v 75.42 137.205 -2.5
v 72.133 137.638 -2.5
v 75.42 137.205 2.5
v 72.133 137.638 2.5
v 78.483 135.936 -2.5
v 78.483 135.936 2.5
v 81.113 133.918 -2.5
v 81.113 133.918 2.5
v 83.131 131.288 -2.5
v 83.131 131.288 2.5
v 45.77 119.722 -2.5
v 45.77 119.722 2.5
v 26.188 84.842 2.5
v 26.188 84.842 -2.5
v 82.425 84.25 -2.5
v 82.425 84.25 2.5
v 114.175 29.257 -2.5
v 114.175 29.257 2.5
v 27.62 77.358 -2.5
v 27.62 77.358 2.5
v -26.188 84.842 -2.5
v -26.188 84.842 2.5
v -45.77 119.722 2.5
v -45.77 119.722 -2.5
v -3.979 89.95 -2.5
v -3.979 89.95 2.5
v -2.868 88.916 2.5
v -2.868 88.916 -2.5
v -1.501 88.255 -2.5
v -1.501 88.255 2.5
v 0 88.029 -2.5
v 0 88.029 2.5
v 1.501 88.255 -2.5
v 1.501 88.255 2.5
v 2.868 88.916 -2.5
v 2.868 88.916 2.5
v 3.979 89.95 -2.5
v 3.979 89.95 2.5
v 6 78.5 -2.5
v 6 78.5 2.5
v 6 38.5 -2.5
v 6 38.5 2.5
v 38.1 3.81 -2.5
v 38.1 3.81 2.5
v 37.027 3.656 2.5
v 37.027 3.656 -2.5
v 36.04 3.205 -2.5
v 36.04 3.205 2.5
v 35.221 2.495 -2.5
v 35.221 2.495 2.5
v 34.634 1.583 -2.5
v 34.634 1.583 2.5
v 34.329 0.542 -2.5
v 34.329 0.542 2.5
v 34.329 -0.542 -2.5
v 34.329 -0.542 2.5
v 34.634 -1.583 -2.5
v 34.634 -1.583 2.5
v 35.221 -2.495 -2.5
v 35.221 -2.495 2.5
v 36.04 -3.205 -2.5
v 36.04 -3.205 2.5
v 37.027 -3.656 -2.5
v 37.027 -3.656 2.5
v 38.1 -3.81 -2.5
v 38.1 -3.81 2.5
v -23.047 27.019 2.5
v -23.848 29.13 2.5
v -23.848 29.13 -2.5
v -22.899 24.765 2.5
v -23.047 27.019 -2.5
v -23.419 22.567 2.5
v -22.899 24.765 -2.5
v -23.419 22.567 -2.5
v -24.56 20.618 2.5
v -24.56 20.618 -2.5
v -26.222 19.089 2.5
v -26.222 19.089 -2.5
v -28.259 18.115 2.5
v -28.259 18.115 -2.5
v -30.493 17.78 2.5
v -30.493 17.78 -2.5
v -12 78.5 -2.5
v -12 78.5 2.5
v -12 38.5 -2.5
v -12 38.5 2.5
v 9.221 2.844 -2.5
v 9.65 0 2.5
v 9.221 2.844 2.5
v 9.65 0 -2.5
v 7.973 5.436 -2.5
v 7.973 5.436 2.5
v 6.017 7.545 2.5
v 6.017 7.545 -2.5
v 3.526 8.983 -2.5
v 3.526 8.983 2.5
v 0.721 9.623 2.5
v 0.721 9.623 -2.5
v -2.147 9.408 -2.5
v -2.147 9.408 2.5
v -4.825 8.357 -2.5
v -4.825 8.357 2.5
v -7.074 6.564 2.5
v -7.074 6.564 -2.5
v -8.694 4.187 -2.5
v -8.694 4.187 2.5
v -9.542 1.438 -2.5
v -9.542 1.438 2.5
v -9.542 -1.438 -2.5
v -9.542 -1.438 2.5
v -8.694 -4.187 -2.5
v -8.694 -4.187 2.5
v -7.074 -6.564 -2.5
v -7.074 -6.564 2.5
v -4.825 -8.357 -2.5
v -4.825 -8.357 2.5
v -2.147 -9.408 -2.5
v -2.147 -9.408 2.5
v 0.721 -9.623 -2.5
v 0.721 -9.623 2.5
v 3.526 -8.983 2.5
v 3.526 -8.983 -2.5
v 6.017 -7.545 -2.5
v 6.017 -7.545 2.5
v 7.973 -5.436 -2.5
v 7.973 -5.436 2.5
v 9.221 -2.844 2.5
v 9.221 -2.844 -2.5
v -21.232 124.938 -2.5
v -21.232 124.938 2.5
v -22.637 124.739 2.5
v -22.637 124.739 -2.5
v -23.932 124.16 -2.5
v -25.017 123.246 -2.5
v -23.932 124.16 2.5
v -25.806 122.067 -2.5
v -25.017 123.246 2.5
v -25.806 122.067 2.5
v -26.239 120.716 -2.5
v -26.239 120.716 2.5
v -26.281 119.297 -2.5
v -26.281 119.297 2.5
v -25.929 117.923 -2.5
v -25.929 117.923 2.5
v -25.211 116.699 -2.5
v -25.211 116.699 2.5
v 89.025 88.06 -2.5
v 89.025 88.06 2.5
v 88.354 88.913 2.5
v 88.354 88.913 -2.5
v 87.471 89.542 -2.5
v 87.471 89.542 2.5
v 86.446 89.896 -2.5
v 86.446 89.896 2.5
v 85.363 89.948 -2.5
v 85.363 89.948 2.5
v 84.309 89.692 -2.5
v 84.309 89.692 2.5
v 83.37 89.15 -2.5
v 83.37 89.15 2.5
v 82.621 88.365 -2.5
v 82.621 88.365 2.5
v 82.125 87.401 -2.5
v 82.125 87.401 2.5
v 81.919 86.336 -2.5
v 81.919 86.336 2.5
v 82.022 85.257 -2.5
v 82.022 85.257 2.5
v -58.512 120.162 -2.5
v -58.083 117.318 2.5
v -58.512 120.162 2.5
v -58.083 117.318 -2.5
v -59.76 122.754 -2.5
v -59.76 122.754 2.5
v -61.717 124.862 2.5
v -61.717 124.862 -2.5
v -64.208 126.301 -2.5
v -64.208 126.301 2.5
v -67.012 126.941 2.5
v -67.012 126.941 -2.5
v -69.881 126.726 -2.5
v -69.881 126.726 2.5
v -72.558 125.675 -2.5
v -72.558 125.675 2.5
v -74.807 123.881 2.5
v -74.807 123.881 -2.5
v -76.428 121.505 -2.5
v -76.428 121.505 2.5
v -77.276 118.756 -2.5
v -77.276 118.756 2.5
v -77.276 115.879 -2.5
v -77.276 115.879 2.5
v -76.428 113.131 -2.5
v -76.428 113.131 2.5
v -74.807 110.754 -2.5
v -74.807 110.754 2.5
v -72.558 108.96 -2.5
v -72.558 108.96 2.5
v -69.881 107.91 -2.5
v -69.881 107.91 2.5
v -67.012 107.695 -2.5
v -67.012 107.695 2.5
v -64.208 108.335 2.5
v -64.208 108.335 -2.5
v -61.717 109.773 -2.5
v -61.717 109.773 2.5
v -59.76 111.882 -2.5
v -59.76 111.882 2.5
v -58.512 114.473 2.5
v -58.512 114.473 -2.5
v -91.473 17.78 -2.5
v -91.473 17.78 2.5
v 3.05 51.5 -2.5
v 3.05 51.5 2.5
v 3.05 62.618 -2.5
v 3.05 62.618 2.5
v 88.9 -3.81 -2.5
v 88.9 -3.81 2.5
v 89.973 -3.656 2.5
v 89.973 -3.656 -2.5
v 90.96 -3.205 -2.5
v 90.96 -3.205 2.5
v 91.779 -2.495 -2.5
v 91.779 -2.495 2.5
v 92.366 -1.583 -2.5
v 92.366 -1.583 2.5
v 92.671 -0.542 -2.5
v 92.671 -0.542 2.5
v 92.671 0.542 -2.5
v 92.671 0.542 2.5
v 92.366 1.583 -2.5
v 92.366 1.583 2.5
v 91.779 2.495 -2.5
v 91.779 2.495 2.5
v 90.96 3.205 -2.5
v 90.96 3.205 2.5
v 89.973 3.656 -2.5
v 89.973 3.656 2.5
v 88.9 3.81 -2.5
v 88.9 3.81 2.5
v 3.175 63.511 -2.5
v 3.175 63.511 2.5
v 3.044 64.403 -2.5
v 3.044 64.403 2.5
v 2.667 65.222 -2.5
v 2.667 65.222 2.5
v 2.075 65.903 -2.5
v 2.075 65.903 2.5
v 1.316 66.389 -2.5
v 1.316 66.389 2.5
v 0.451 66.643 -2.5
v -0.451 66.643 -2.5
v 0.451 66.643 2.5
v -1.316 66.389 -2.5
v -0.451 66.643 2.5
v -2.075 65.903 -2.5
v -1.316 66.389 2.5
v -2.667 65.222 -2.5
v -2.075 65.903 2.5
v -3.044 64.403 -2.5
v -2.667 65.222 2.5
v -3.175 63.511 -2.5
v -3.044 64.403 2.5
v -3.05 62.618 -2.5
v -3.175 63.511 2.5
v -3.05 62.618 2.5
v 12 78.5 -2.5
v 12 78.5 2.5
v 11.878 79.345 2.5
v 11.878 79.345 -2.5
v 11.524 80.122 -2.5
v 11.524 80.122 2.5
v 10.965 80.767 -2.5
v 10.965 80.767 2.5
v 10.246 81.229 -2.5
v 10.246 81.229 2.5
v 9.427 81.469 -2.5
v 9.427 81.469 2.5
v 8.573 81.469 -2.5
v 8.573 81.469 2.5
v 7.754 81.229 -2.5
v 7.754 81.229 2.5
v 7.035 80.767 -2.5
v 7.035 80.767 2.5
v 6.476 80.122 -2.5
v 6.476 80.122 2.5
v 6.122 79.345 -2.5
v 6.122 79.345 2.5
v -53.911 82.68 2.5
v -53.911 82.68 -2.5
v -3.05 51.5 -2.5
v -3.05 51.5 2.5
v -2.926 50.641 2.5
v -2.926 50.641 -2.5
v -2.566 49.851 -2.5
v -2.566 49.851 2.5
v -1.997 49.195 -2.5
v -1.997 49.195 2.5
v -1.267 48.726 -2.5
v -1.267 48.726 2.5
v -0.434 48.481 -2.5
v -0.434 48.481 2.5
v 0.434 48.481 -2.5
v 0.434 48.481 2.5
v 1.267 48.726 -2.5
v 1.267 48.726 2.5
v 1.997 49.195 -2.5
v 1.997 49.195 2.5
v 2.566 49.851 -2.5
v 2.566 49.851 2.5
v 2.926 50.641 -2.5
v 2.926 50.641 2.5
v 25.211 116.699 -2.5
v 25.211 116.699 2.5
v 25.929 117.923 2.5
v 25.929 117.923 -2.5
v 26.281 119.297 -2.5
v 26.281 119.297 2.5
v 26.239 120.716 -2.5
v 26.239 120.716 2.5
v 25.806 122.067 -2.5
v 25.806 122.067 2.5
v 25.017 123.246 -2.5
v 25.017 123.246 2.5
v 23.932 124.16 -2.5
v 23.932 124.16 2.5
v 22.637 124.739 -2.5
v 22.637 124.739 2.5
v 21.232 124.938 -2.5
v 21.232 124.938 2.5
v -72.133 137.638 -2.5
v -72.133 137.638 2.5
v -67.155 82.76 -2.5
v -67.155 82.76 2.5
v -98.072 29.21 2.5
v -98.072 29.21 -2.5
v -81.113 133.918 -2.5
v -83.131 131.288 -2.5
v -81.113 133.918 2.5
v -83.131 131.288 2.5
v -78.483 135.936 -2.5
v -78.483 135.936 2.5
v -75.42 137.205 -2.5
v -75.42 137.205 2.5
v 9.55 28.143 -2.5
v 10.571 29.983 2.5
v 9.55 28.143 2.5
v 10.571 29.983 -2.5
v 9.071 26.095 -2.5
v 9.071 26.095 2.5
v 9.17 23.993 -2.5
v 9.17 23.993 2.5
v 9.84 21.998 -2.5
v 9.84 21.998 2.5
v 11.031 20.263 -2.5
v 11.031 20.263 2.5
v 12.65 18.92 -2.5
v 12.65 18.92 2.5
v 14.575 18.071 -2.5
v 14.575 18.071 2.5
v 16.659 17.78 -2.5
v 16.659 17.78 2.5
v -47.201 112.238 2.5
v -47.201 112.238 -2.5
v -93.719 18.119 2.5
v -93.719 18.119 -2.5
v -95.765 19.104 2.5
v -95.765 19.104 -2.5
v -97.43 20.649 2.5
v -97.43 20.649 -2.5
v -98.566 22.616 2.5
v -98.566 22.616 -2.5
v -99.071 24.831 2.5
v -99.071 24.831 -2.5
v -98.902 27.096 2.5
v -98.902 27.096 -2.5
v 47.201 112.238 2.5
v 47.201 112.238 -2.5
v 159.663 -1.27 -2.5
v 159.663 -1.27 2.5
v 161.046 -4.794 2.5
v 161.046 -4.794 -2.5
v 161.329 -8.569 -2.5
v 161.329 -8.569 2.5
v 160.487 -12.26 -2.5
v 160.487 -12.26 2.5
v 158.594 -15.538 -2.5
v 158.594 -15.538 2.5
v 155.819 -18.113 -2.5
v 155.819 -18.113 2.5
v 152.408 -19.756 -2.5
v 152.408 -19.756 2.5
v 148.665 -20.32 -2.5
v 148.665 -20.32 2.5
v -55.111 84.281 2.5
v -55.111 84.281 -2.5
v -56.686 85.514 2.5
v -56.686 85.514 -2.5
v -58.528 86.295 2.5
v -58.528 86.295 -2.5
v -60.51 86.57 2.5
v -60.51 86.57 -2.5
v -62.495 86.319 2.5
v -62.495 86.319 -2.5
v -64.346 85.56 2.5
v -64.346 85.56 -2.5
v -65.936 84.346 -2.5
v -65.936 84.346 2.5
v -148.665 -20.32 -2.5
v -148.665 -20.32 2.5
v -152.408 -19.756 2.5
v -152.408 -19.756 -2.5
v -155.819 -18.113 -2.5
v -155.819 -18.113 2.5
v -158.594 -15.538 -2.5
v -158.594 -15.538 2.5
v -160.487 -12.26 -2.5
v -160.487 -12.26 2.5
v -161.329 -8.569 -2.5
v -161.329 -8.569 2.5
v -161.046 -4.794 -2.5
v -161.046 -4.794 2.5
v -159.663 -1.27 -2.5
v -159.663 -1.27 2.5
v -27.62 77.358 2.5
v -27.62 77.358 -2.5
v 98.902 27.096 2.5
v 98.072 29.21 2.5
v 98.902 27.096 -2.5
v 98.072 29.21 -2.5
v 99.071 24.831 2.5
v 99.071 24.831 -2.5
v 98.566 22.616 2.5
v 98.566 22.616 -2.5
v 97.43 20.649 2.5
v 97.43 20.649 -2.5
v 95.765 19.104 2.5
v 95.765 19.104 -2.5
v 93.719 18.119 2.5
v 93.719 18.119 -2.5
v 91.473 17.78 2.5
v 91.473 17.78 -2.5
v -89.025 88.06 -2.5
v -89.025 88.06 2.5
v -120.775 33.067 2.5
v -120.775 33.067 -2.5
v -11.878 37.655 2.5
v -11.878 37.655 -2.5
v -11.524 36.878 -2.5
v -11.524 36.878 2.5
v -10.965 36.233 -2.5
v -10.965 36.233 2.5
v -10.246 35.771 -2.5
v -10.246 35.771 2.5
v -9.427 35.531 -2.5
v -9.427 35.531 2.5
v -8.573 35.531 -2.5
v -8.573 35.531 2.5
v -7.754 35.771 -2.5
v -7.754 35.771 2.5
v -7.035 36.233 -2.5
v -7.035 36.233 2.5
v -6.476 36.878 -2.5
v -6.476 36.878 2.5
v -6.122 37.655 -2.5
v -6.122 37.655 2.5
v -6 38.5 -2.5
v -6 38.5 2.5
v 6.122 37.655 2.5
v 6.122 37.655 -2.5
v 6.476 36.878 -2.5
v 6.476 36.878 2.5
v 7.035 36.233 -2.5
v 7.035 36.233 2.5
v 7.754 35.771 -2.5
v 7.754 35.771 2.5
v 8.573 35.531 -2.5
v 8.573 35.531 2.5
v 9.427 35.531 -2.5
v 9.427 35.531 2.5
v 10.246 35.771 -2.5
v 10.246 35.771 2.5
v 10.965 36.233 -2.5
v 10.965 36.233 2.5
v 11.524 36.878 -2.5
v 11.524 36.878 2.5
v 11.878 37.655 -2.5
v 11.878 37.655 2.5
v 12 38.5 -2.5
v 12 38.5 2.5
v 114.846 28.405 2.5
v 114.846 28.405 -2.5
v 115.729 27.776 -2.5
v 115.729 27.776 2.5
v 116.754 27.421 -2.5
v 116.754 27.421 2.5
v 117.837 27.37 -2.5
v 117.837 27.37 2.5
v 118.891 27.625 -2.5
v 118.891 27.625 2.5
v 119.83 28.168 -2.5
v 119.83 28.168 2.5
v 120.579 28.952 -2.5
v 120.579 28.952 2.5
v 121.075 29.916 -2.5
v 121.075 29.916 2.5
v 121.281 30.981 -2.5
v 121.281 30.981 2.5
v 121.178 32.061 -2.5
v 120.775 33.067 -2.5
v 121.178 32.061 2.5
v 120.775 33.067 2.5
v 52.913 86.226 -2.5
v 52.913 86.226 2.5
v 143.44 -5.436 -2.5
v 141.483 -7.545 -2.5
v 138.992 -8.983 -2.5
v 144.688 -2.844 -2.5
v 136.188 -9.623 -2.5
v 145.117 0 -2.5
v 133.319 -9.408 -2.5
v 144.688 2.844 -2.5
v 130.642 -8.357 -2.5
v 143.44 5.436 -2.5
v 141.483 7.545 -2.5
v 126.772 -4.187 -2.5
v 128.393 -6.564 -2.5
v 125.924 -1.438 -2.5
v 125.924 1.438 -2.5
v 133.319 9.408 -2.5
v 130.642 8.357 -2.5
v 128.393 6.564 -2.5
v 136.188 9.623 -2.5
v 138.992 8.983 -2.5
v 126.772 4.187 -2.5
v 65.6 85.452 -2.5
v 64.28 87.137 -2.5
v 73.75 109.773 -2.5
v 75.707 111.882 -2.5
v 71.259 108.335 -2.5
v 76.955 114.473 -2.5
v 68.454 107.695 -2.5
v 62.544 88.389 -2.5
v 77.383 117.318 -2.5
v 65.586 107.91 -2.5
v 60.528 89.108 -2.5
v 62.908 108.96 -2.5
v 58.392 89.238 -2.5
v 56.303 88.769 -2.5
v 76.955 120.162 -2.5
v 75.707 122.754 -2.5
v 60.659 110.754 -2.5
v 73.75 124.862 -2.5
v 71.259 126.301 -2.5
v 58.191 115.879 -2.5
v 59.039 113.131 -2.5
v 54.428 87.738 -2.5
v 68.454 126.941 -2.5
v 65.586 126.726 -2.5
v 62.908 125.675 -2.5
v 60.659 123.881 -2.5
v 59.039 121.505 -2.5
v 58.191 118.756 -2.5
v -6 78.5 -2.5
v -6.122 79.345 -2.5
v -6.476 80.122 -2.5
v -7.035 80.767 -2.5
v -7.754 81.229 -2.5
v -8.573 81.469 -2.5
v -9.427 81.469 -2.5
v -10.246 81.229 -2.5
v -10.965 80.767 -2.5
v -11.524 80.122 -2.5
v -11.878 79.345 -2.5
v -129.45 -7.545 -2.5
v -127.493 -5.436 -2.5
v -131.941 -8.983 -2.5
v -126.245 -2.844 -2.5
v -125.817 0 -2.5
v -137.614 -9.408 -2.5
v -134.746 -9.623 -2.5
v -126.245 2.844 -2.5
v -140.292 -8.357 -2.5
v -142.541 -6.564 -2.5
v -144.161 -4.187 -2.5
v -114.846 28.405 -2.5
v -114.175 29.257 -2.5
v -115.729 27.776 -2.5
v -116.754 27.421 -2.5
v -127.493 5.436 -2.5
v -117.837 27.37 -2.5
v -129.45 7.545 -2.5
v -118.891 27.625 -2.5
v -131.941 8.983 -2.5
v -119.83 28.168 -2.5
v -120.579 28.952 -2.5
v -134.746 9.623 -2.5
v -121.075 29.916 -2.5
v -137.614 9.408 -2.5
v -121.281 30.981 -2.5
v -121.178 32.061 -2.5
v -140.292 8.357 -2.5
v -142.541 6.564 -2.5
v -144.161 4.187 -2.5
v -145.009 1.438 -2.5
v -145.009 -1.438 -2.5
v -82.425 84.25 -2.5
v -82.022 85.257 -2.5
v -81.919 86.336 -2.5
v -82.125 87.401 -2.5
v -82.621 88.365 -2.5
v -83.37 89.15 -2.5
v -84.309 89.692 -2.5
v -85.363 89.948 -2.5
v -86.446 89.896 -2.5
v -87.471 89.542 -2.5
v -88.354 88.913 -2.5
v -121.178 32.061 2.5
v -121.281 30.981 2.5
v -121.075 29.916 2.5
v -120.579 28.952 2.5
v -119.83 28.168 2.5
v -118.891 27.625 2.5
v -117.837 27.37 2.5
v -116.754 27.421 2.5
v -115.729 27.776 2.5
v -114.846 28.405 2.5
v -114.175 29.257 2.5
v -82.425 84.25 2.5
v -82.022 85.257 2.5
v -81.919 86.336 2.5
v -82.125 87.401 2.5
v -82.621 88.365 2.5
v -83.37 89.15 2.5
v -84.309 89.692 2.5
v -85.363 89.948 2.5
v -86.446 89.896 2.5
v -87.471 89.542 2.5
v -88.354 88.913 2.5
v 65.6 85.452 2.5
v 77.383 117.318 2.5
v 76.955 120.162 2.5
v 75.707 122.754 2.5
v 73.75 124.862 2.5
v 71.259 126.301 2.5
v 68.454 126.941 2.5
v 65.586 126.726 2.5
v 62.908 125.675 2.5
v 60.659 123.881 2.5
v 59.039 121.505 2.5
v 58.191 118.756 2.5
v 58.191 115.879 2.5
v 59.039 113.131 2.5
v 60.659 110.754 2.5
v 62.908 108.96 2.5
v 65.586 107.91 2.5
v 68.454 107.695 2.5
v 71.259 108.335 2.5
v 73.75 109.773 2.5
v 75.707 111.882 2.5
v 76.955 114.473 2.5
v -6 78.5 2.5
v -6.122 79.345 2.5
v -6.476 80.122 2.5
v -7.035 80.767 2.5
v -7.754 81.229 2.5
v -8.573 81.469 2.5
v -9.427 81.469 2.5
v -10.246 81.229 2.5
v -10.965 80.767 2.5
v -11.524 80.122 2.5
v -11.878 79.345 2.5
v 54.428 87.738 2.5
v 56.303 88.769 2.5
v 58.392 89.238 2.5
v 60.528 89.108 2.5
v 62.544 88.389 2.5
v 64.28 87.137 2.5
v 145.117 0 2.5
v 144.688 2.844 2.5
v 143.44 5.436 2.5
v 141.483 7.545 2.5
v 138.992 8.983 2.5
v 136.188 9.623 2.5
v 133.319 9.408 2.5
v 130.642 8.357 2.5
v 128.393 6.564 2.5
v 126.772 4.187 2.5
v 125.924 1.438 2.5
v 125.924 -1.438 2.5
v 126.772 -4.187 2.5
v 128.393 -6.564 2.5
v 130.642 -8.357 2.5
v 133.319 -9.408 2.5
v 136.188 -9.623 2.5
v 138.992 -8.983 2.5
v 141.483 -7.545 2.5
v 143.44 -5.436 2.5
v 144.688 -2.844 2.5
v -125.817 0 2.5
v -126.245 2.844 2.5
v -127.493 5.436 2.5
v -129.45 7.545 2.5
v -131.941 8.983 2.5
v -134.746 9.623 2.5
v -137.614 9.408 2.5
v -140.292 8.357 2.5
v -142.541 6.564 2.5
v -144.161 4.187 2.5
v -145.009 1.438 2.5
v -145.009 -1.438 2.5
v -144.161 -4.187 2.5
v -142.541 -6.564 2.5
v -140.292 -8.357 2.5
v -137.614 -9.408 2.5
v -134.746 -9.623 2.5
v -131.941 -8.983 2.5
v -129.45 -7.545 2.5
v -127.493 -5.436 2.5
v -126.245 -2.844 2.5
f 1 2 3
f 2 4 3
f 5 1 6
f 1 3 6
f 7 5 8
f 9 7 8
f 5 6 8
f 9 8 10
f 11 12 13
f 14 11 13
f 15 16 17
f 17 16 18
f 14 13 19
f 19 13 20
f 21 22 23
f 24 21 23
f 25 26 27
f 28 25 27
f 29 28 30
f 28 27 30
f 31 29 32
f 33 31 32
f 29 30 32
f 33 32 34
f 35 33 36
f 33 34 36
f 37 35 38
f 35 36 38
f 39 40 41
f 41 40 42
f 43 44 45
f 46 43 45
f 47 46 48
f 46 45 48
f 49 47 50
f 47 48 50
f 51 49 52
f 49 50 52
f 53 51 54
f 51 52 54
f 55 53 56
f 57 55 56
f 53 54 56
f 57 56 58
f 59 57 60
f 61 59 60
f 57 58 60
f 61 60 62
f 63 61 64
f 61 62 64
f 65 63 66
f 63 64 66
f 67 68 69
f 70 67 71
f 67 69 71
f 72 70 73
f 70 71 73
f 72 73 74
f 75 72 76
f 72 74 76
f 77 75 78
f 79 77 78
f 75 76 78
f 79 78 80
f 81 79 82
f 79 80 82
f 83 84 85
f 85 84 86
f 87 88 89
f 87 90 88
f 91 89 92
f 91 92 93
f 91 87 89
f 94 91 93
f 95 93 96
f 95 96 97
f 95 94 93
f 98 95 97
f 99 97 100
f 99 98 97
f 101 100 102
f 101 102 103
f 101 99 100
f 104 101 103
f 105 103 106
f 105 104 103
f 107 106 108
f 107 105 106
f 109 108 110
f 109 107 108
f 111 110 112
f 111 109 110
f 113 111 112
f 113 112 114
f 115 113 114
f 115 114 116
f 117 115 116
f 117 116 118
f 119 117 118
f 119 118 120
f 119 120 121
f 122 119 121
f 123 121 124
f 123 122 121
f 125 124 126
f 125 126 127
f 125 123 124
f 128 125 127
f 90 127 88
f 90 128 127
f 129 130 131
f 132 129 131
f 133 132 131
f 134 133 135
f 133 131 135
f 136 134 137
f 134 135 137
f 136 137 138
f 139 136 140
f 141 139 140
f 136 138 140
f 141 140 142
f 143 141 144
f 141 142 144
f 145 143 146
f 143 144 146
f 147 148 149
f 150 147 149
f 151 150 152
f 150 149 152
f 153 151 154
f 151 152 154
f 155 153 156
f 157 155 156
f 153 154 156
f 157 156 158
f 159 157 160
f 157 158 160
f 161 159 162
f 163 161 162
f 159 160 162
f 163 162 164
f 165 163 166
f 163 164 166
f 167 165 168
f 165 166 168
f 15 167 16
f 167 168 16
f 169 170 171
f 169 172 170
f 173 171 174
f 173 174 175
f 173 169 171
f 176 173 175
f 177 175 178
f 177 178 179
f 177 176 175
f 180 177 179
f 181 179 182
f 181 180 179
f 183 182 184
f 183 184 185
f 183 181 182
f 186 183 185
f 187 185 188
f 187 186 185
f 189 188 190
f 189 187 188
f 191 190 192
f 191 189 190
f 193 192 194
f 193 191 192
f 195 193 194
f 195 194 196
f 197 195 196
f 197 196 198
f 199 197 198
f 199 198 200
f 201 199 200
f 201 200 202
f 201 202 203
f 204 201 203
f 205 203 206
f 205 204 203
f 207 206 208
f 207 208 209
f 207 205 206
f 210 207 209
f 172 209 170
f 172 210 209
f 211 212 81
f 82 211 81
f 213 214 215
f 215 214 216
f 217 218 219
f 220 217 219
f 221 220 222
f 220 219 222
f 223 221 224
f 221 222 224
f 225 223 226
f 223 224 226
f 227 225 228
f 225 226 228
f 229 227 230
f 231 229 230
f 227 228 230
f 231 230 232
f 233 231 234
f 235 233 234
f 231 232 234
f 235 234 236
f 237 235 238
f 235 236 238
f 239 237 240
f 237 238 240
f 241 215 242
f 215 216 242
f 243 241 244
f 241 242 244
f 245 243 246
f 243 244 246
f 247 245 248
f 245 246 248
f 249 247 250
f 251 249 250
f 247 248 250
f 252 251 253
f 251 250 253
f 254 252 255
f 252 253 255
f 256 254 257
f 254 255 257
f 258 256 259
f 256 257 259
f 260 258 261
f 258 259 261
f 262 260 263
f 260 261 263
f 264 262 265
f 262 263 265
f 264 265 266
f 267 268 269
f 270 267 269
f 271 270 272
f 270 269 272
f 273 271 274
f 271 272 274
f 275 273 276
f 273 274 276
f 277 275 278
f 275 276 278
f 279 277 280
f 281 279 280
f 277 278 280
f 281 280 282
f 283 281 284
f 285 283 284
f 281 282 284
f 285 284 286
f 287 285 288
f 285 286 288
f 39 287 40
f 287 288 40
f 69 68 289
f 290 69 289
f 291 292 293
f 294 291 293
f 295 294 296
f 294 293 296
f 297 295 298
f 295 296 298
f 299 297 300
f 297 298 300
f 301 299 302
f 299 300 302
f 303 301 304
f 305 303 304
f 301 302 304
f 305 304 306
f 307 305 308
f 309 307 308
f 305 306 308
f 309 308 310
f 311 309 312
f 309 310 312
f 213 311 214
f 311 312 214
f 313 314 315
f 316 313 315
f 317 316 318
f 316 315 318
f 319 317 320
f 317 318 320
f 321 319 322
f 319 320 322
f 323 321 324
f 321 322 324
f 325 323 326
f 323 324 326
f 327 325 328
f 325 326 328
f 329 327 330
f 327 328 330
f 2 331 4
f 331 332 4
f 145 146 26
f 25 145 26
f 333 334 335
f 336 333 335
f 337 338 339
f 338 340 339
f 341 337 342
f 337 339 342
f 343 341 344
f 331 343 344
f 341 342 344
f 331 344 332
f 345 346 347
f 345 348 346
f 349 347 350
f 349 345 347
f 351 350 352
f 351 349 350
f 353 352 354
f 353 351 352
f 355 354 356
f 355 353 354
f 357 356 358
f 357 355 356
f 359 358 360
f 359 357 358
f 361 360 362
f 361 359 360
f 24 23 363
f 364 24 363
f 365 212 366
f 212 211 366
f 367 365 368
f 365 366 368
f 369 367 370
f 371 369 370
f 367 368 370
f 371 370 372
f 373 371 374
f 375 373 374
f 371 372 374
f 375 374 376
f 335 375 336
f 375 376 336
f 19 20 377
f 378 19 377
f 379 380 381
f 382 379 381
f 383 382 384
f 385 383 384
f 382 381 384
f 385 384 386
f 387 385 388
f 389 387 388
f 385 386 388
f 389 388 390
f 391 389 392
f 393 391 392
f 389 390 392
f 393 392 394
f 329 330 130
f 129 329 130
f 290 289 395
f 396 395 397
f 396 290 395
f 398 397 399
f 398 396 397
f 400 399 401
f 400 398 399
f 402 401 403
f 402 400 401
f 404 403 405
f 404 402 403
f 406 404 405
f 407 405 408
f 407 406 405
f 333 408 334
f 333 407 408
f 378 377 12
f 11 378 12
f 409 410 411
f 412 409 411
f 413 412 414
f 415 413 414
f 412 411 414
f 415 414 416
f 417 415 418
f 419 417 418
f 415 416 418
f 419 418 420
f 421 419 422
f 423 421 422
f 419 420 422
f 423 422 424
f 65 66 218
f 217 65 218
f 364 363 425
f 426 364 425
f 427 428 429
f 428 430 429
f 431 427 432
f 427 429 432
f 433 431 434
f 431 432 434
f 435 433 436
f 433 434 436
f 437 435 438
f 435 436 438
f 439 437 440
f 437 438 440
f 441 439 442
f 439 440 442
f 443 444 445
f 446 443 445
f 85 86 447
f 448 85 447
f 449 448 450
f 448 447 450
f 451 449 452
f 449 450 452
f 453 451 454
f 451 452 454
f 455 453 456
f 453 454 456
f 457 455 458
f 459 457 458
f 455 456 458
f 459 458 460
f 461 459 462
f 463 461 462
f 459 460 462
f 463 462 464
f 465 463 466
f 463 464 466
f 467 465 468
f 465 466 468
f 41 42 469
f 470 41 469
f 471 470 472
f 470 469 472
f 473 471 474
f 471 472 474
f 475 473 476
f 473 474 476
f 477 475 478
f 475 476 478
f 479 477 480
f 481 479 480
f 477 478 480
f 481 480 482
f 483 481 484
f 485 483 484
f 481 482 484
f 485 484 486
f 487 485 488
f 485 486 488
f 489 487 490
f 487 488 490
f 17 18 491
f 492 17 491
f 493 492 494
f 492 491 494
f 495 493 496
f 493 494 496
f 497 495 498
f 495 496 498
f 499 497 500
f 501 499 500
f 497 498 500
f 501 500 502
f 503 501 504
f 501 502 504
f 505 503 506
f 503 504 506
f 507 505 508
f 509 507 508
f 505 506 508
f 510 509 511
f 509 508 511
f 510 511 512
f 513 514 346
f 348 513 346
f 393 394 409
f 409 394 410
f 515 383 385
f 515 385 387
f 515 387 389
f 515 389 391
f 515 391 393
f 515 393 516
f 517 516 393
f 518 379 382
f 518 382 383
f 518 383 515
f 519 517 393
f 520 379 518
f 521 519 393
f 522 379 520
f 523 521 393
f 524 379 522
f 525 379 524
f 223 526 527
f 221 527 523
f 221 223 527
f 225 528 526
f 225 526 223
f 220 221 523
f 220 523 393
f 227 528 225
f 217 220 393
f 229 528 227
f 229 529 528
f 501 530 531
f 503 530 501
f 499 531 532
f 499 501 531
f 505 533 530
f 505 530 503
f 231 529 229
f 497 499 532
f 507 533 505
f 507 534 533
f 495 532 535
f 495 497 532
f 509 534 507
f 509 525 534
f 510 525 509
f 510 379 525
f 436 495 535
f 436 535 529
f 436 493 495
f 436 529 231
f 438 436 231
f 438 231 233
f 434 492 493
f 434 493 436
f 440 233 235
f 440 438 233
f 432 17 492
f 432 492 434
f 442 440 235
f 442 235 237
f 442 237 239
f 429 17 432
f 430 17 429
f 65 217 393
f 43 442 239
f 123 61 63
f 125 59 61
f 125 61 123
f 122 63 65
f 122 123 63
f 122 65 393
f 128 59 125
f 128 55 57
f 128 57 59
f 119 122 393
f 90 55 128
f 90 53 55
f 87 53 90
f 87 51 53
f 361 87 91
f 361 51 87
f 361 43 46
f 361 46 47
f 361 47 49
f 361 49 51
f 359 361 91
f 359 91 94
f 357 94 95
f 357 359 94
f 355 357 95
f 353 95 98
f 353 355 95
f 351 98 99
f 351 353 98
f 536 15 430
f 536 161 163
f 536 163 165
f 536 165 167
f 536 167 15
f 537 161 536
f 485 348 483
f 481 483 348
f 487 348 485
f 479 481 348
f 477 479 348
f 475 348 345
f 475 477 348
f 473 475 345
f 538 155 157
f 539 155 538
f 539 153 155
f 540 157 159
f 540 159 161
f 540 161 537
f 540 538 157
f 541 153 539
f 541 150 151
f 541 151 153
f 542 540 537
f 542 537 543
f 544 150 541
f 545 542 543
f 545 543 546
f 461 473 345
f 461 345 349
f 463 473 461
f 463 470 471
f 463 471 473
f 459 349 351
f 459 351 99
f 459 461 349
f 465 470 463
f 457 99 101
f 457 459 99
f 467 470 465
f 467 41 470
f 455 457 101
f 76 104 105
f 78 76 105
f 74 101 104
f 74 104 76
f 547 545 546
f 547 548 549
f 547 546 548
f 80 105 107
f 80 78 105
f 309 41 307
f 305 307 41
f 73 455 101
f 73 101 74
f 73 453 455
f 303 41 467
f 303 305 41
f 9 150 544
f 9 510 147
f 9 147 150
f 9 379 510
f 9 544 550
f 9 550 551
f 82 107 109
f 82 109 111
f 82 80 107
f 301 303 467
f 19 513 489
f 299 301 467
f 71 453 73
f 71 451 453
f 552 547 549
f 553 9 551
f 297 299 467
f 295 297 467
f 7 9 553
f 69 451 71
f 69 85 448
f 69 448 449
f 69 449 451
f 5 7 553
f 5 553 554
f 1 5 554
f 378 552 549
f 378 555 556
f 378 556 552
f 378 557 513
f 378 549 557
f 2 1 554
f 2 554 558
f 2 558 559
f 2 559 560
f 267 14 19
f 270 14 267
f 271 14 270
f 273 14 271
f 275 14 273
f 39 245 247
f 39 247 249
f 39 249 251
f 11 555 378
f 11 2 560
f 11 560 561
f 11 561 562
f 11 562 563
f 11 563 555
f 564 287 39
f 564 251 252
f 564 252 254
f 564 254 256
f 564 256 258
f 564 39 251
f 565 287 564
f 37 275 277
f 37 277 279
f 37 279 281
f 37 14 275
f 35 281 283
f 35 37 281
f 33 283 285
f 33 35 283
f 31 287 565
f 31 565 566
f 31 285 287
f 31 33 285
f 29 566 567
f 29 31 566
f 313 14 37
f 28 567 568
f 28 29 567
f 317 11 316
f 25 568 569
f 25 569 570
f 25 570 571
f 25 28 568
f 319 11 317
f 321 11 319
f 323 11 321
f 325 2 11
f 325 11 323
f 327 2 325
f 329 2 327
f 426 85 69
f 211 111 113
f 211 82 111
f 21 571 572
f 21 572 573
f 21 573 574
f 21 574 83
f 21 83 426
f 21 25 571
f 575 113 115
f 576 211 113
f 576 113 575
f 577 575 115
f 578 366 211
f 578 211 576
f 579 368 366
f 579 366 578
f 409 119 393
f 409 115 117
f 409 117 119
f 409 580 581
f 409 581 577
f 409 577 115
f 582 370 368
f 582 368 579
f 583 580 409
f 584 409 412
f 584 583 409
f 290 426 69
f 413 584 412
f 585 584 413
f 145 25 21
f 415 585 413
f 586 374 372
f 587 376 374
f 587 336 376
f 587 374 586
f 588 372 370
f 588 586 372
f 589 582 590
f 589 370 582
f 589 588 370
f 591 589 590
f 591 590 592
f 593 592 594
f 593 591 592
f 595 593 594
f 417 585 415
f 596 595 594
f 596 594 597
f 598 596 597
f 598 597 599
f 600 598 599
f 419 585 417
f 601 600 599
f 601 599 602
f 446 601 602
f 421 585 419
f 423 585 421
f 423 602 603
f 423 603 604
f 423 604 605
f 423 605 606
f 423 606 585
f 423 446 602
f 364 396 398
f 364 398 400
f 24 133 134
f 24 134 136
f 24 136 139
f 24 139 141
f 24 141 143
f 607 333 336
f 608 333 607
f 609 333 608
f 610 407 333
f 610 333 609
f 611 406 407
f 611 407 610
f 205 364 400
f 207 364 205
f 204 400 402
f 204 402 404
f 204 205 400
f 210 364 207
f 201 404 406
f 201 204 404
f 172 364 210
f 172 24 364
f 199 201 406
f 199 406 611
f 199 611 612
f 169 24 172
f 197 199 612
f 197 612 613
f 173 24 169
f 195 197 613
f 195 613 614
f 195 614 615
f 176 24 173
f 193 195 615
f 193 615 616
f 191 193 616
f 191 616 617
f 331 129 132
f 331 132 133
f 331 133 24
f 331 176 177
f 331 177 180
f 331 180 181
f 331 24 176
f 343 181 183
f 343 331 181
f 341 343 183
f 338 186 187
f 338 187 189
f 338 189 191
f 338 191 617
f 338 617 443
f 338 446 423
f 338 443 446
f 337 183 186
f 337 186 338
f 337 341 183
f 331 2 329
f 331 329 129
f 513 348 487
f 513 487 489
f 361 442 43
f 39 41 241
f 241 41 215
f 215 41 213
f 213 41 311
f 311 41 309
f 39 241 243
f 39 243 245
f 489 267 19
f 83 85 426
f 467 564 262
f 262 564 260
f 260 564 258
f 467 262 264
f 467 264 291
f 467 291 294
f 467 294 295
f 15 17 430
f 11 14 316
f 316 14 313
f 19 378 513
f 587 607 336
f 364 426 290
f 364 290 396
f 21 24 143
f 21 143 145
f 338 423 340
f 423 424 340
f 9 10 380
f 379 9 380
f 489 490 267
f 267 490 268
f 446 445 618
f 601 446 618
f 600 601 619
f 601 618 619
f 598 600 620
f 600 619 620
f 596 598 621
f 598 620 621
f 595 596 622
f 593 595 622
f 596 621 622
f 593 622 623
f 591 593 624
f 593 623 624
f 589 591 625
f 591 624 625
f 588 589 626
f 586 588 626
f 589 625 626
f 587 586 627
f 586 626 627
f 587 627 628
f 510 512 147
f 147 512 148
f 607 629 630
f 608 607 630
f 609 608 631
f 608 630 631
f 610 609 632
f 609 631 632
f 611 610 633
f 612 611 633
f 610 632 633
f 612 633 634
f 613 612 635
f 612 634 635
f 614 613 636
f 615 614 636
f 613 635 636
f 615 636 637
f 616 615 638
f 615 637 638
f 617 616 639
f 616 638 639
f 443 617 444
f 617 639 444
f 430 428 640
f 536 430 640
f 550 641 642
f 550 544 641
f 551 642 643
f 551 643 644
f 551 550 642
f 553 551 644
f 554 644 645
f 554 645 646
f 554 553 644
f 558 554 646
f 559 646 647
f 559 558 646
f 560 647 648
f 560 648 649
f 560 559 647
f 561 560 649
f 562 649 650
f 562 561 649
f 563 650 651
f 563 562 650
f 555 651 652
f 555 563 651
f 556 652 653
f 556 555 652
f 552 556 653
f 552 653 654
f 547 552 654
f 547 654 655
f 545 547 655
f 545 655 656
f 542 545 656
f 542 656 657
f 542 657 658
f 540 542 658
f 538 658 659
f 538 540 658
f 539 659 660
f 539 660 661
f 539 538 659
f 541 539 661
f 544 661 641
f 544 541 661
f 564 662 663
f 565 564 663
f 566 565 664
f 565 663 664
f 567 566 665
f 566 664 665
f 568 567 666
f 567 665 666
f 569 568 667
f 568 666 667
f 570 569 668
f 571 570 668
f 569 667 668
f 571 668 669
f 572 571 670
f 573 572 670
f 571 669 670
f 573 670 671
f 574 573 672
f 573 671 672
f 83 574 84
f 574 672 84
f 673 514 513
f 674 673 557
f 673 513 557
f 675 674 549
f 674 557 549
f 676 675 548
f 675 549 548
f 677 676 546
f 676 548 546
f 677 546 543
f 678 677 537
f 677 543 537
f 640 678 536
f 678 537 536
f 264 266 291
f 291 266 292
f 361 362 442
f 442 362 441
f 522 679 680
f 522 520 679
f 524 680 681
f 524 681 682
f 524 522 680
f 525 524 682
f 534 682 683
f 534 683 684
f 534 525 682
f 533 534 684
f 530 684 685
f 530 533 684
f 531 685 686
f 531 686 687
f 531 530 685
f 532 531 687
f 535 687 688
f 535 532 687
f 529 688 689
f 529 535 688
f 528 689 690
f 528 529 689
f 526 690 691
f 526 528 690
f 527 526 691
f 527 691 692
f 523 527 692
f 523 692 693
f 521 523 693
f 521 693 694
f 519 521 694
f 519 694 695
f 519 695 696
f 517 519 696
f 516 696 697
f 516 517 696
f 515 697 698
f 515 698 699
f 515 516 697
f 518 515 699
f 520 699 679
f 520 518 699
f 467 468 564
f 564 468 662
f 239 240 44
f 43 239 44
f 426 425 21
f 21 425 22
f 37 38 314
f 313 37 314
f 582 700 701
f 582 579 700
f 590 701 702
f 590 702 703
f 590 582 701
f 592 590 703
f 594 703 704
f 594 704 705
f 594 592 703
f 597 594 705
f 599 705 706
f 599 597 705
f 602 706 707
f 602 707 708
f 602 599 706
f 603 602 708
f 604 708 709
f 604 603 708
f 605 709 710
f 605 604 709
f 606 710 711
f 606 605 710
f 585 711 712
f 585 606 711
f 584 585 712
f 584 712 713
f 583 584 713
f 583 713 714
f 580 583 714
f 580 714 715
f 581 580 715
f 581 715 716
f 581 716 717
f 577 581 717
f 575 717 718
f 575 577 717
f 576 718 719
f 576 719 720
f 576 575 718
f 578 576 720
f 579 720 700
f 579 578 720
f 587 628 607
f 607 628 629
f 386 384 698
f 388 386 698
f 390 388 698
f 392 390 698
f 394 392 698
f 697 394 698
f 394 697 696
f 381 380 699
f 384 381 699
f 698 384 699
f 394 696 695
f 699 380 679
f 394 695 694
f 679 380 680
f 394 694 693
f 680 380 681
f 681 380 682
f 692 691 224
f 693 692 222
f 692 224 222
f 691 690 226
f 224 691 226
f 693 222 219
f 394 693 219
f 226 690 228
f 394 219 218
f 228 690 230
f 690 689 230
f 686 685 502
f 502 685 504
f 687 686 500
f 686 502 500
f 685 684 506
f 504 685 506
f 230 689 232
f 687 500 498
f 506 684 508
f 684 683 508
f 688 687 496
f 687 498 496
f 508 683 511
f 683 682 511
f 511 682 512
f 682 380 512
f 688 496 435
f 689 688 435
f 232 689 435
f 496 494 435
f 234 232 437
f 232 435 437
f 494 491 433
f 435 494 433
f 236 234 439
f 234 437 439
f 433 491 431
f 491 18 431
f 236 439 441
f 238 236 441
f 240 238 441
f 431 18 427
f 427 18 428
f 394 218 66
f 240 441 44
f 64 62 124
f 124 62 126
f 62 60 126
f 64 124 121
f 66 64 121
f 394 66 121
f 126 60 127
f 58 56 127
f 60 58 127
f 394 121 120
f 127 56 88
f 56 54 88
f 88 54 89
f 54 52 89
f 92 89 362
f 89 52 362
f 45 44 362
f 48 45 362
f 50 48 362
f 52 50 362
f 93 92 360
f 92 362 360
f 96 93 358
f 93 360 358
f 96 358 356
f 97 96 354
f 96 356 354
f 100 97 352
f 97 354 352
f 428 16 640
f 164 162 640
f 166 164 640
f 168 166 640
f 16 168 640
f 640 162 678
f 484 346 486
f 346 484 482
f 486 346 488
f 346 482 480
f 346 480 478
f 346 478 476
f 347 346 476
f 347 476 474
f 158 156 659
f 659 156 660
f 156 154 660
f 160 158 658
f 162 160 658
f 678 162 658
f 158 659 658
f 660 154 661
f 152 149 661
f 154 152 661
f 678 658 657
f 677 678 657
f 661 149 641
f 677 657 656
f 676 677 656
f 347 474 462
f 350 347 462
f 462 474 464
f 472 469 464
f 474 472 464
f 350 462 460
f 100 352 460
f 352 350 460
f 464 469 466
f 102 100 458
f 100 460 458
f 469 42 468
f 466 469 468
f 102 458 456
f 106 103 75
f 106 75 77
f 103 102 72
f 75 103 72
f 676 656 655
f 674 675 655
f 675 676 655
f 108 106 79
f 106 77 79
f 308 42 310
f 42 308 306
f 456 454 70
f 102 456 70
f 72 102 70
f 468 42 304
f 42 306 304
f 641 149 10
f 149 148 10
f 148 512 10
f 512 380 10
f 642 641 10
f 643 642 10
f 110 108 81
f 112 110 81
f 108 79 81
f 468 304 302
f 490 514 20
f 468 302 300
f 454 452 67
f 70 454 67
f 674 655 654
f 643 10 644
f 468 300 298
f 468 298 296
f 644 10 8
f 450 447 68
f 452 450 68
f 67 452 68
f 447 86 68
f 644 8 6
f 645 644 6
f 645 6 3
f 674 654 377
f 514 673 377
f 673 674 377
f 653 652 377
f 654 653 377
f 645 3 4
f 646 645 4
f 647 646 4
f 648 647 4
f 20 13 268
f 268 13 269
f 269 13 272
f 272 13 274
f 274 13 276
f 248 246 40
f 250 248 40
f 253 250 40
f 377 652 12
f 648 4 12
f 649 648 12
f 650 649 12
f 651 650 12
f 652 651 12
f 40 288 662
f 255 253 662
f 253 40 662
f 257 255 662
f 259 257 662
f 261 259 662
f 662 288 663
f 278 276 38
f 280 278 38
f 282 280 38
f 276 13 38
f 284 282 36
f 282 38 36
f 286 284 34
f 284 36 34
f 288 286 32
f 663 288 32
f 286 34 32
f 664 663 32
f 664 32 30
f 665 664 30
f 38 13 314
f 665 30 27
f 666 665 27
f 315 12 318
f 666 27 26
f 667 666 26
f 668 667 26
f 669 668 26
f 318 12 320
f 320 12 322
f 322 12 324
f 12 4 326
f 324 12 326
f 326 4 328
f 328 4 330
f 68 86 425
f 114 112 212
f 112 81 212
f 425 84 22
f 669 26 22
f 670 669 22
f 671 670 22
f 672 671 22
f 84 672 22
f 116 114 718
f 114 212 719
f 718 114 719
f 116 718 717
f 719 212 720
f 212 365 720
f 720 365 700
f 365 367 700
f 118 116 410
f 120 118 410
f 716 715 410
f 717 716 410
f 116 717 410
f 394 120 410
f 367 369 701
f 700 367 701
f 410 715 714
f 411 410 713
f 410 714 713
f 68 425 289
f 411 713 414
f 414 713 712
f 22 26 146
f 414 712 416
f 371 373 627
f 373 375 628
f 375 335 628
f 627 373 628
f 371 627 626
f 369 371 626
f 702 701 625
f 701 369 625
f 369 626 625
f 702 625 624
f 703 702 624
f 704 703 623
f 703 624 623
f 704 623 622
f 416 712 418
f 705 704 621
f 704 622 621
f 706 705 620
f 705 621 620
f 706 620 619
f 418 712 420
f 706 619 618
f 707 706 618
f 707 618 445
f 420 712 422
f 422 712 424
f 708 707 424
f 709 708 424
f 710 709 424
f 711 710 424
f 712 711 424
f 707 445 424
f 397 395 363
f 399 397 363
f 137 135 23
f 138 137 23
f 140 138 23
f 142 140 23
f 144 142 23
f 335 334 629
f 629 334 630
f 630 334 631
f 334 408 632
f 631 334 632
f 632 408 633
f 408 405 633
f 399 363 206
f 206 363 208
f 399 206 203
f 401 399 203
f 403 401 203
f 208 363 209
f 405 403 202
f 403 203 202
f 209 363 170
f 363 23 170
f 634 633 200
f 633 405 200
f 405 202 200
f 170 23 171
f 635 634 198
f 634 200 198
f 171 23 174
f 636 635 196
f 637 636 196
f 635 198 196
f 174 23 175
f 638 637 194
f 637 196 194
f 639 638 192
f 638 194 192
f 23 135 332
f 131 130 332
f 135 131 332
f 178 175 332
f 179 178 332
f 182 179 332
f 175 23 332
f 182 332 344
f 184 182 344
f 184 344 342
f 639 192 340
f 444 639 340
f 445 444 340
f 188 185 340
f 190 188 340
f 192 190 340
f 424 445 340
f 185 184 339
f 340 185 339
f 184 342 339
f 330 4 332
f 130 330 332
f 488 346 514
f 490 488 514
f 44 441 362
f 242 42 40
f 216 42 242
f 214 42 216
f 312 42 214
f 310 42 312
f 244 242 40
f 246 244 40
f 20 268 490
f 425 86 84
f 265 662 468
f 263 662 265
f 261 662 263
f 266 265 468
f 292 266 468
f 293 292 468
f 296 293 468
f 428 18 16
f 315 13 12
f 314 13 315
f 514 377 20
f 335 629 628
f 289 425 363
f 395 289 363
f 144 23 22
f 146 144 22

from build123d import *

# Parameters (mm, degrees)
SKETCH1_R           = 9.65
BOSS_EXTRUDE1_DEPTH = 2.5
CUT_EXTRUDE2_DEPTH  = 6
FILLET1_R           = 7.62
SKETCH3_R           = 3.175
CUT_EXTRUDE3_DEPTH  = 31.75
CUT_EXTRUDE4_DEPTH  = 6


with BuildPart() as part:
    # Sketch1 → Boss-Extrude1 (new body, symmetric)
    with BuildSketch(Plane.XY):
        with BuildLine():
            ThreePointArc((-148.66489382, -20.32), (-159.663416448, -13.97), (-159.663416448, -1.27))
            Line((-159.663416448, -1.27), (-83.131265013, 131.287574699))
            ThreePointArc((-83.131265013, 131.287574699), (-78.482742385, 135.936097327), (-72.132742385, 137.637574699))
            Line((-72.132742385, 137.637574699), (72.132742385, 137.637574699))
            ThreePointArc((72.132742385, 137.637574699), (78.482742385, 135.936097327), (83.131265013, 131.287574699))
            Line((83.131265013, 131.287574699), (159.663416448, -1.27))
            ThreePointArc((159.663416448, -1.27), (159.663416448, -13.97), (148.66489382, -20.32))
            Line((148.66489382, -20.32), (-148.66489382, -20.32))
        make_face()
        Circle(SKETCH1_R, mode=Mode.SUBTRACT)
        with Locations((-135.466666667, 0)):
            Circle(SKETCH1_R, mode=Mode.SUBTRACT)
        with Locations((135.466666667, 0)):
            Circle(SKETCH1_R, mode=Mode.SUBTRACT)
        with Locations((-67.733333333, 117.317574699)):
            Circle(SKETCH1_R, mode=Mode.SUBTRACT)
        with Locations((67.733333333, 117.317574699)):
            Circle(SKETCH1_R, mode=Mode.SUBTRACT)
    extrude(amount=BOSS_EXTRUDE1_DEPTH, both=True)

    # Sketch2 → Cut-Extrude2 (cut, through all)
    with BuildSketch(Plane.XY.offset(2.5)):
        Polygon((-17.476488174, 17.78), (-60.462836348, 94.350444874), (-104.670803308, 17.78), align=None)
        Polygon((59.840980548, 95.427530715), (1.38432688, 17.78), (104.670803308, 17.78), align=None)
    extrude(amount=-CUT_EXTRUDE2_DEPTH, mode=Mode.SUBTRACT)

    # Fillet1
    fillet1_edges = [part.edges().sort_by_distance(p)[0] for p in [
        (-17.476488174, 17.78, 0),
        (-104.670803308, 17.78, 0),
        (-60.462836348, 94.350444874, 0),
        (59.840980548, 95.427530715, 0),
        (104.670803308, 17.78, 0),
        (1.38432688, 17.78, 0),
    ]]
    fillet(fillet1_edges, radius=FILLET1_R)

    # Sketch3 → Cut-Extrude3 (cut)
    with BuildSketch(Plane.XY.offset(2.5)):
        with Locations((0, 63.5)):
            Circle(SKETCH3_R)
    extrude(amount=-CUT_EXTRUDE3_DEPTH, mode=Mode.SUBTRACT)

    # Sketch4 → Cut-Extrude4 (cut, through all)
    with BuildSketch(Plane.XY.offset(2.5)):
        with BuildLine():
            Line((-114.175443212, 29.25748078), (-82.425443212, 84.25009392))
            ThreePointArc((-82.425443212, 84.25009392), (-83.82, 89.454650708), (-89.024556788, 88.06009392))
            Line((-89.024556788, 88.06009392), (-120.774556788, 33.06748078))
            ThreePointArc((-120.774556788, 33.06748078), (-119.38, 27.862923991), (-114.175443212, 29.25748078))
        make_face()
        Polygon((-47.20148926, 112.237574699), (-27.620295809, 77.358112791), (-26.188384166, 84.842364861), (-45.769577617, 119.721826769), align=None)
        Polygon((45.769577617, 119.721826769), (26.188384166, 84.842364861), (27.620295809, 77.358112791), (47.20148926, 112.237574699), align=None)
        with BuildLine():
            Line((3.978915409, 89.950381514), (25.210877866, 116.699310593))
            ThreePointArc((25.210877866, 116.699310593), (25.806368519, 122.066920569), (21.231962456, 124.937574699))
            Line((21.231962456, 124.937574699), (-21.231962456, 124.937574699))
            ThreePointArc((-21.231962456, 124.937574699), (-25.806368519, 122.066920569), (-25.210877866, 116.699310593))
            Line((-25.210877866, 116.699310593), (-3.978915409, 89.950381514))
            ThreePointArc((-3.978915409, 89.950381514), (0, 88.028645621), (3.978915409, 89.950381514))
        make_face()
        with BuildLine():
            Line((82.425443212, 84.25009392), (114.175443212, 29.25748078))
            ThreePointArc((114.175443212, 29.25748078), (119.38, 27.862923991), (120.774556788, 33.06748078))
            Line((120.774556788, 33.06748078), (89.024556788, 88.06009392))
            ThreePointArc((89.024556788, 88.06009392), (83.82, 89.454650708), (82.425443212, 84.25009392))
        make_face()
        with BuildLine():
            Line((88.9, 3.81), (38.1, 3.81))
            ThreePointArc((38.1, 3.81), (34.29, 0), (38.1, -3.81))
            Line((38.1, -3.81), (88.9, -3.81))
            ThreePointArc((88.9, -3.81), (92.71, 0), (88.9, 3.81))
        make_face()
        with BuildLine():
            Line((-3.05, 63.5), (-3.05, 51.5))
            ThreePointArc((-3.05, 51.5), (0, 48.45), (3.05, 51.5))
            Line((3.05, 51.5), (3.05, 63.5))
            ThreePointArc((3.05, 63.5), (0, 66.55), (-3.05, 63.5))
        make_face()
        with BuildLine():
            Line((6, 78.5), (6, 38.5))
            ThreePointArc((6, 38.5), (9, 35.5), (12, 38.5))
            Line((12, 38.5), (12, 78.5))
            ThreePointArc((12, 78.5), (9, 81.5), (6, 78.5))
        make_face()
        with BuildLine():
            Line((-12, 78.5), (-12, 38.5))
            ThreePointArc((-12, 38.5), (-9, 35.5), (-6, 38.5))
            Line((-6, 38.5), (-6, 78.5))
            ThreePointArc((-6, 78.5), (-9, 81.5), (-12, 78.5))
        make_face()
    extrude(amount=-CUT_EXTRUDE4_DEPTH, mode=Mode.SUBTRACT)


solid = part.part
